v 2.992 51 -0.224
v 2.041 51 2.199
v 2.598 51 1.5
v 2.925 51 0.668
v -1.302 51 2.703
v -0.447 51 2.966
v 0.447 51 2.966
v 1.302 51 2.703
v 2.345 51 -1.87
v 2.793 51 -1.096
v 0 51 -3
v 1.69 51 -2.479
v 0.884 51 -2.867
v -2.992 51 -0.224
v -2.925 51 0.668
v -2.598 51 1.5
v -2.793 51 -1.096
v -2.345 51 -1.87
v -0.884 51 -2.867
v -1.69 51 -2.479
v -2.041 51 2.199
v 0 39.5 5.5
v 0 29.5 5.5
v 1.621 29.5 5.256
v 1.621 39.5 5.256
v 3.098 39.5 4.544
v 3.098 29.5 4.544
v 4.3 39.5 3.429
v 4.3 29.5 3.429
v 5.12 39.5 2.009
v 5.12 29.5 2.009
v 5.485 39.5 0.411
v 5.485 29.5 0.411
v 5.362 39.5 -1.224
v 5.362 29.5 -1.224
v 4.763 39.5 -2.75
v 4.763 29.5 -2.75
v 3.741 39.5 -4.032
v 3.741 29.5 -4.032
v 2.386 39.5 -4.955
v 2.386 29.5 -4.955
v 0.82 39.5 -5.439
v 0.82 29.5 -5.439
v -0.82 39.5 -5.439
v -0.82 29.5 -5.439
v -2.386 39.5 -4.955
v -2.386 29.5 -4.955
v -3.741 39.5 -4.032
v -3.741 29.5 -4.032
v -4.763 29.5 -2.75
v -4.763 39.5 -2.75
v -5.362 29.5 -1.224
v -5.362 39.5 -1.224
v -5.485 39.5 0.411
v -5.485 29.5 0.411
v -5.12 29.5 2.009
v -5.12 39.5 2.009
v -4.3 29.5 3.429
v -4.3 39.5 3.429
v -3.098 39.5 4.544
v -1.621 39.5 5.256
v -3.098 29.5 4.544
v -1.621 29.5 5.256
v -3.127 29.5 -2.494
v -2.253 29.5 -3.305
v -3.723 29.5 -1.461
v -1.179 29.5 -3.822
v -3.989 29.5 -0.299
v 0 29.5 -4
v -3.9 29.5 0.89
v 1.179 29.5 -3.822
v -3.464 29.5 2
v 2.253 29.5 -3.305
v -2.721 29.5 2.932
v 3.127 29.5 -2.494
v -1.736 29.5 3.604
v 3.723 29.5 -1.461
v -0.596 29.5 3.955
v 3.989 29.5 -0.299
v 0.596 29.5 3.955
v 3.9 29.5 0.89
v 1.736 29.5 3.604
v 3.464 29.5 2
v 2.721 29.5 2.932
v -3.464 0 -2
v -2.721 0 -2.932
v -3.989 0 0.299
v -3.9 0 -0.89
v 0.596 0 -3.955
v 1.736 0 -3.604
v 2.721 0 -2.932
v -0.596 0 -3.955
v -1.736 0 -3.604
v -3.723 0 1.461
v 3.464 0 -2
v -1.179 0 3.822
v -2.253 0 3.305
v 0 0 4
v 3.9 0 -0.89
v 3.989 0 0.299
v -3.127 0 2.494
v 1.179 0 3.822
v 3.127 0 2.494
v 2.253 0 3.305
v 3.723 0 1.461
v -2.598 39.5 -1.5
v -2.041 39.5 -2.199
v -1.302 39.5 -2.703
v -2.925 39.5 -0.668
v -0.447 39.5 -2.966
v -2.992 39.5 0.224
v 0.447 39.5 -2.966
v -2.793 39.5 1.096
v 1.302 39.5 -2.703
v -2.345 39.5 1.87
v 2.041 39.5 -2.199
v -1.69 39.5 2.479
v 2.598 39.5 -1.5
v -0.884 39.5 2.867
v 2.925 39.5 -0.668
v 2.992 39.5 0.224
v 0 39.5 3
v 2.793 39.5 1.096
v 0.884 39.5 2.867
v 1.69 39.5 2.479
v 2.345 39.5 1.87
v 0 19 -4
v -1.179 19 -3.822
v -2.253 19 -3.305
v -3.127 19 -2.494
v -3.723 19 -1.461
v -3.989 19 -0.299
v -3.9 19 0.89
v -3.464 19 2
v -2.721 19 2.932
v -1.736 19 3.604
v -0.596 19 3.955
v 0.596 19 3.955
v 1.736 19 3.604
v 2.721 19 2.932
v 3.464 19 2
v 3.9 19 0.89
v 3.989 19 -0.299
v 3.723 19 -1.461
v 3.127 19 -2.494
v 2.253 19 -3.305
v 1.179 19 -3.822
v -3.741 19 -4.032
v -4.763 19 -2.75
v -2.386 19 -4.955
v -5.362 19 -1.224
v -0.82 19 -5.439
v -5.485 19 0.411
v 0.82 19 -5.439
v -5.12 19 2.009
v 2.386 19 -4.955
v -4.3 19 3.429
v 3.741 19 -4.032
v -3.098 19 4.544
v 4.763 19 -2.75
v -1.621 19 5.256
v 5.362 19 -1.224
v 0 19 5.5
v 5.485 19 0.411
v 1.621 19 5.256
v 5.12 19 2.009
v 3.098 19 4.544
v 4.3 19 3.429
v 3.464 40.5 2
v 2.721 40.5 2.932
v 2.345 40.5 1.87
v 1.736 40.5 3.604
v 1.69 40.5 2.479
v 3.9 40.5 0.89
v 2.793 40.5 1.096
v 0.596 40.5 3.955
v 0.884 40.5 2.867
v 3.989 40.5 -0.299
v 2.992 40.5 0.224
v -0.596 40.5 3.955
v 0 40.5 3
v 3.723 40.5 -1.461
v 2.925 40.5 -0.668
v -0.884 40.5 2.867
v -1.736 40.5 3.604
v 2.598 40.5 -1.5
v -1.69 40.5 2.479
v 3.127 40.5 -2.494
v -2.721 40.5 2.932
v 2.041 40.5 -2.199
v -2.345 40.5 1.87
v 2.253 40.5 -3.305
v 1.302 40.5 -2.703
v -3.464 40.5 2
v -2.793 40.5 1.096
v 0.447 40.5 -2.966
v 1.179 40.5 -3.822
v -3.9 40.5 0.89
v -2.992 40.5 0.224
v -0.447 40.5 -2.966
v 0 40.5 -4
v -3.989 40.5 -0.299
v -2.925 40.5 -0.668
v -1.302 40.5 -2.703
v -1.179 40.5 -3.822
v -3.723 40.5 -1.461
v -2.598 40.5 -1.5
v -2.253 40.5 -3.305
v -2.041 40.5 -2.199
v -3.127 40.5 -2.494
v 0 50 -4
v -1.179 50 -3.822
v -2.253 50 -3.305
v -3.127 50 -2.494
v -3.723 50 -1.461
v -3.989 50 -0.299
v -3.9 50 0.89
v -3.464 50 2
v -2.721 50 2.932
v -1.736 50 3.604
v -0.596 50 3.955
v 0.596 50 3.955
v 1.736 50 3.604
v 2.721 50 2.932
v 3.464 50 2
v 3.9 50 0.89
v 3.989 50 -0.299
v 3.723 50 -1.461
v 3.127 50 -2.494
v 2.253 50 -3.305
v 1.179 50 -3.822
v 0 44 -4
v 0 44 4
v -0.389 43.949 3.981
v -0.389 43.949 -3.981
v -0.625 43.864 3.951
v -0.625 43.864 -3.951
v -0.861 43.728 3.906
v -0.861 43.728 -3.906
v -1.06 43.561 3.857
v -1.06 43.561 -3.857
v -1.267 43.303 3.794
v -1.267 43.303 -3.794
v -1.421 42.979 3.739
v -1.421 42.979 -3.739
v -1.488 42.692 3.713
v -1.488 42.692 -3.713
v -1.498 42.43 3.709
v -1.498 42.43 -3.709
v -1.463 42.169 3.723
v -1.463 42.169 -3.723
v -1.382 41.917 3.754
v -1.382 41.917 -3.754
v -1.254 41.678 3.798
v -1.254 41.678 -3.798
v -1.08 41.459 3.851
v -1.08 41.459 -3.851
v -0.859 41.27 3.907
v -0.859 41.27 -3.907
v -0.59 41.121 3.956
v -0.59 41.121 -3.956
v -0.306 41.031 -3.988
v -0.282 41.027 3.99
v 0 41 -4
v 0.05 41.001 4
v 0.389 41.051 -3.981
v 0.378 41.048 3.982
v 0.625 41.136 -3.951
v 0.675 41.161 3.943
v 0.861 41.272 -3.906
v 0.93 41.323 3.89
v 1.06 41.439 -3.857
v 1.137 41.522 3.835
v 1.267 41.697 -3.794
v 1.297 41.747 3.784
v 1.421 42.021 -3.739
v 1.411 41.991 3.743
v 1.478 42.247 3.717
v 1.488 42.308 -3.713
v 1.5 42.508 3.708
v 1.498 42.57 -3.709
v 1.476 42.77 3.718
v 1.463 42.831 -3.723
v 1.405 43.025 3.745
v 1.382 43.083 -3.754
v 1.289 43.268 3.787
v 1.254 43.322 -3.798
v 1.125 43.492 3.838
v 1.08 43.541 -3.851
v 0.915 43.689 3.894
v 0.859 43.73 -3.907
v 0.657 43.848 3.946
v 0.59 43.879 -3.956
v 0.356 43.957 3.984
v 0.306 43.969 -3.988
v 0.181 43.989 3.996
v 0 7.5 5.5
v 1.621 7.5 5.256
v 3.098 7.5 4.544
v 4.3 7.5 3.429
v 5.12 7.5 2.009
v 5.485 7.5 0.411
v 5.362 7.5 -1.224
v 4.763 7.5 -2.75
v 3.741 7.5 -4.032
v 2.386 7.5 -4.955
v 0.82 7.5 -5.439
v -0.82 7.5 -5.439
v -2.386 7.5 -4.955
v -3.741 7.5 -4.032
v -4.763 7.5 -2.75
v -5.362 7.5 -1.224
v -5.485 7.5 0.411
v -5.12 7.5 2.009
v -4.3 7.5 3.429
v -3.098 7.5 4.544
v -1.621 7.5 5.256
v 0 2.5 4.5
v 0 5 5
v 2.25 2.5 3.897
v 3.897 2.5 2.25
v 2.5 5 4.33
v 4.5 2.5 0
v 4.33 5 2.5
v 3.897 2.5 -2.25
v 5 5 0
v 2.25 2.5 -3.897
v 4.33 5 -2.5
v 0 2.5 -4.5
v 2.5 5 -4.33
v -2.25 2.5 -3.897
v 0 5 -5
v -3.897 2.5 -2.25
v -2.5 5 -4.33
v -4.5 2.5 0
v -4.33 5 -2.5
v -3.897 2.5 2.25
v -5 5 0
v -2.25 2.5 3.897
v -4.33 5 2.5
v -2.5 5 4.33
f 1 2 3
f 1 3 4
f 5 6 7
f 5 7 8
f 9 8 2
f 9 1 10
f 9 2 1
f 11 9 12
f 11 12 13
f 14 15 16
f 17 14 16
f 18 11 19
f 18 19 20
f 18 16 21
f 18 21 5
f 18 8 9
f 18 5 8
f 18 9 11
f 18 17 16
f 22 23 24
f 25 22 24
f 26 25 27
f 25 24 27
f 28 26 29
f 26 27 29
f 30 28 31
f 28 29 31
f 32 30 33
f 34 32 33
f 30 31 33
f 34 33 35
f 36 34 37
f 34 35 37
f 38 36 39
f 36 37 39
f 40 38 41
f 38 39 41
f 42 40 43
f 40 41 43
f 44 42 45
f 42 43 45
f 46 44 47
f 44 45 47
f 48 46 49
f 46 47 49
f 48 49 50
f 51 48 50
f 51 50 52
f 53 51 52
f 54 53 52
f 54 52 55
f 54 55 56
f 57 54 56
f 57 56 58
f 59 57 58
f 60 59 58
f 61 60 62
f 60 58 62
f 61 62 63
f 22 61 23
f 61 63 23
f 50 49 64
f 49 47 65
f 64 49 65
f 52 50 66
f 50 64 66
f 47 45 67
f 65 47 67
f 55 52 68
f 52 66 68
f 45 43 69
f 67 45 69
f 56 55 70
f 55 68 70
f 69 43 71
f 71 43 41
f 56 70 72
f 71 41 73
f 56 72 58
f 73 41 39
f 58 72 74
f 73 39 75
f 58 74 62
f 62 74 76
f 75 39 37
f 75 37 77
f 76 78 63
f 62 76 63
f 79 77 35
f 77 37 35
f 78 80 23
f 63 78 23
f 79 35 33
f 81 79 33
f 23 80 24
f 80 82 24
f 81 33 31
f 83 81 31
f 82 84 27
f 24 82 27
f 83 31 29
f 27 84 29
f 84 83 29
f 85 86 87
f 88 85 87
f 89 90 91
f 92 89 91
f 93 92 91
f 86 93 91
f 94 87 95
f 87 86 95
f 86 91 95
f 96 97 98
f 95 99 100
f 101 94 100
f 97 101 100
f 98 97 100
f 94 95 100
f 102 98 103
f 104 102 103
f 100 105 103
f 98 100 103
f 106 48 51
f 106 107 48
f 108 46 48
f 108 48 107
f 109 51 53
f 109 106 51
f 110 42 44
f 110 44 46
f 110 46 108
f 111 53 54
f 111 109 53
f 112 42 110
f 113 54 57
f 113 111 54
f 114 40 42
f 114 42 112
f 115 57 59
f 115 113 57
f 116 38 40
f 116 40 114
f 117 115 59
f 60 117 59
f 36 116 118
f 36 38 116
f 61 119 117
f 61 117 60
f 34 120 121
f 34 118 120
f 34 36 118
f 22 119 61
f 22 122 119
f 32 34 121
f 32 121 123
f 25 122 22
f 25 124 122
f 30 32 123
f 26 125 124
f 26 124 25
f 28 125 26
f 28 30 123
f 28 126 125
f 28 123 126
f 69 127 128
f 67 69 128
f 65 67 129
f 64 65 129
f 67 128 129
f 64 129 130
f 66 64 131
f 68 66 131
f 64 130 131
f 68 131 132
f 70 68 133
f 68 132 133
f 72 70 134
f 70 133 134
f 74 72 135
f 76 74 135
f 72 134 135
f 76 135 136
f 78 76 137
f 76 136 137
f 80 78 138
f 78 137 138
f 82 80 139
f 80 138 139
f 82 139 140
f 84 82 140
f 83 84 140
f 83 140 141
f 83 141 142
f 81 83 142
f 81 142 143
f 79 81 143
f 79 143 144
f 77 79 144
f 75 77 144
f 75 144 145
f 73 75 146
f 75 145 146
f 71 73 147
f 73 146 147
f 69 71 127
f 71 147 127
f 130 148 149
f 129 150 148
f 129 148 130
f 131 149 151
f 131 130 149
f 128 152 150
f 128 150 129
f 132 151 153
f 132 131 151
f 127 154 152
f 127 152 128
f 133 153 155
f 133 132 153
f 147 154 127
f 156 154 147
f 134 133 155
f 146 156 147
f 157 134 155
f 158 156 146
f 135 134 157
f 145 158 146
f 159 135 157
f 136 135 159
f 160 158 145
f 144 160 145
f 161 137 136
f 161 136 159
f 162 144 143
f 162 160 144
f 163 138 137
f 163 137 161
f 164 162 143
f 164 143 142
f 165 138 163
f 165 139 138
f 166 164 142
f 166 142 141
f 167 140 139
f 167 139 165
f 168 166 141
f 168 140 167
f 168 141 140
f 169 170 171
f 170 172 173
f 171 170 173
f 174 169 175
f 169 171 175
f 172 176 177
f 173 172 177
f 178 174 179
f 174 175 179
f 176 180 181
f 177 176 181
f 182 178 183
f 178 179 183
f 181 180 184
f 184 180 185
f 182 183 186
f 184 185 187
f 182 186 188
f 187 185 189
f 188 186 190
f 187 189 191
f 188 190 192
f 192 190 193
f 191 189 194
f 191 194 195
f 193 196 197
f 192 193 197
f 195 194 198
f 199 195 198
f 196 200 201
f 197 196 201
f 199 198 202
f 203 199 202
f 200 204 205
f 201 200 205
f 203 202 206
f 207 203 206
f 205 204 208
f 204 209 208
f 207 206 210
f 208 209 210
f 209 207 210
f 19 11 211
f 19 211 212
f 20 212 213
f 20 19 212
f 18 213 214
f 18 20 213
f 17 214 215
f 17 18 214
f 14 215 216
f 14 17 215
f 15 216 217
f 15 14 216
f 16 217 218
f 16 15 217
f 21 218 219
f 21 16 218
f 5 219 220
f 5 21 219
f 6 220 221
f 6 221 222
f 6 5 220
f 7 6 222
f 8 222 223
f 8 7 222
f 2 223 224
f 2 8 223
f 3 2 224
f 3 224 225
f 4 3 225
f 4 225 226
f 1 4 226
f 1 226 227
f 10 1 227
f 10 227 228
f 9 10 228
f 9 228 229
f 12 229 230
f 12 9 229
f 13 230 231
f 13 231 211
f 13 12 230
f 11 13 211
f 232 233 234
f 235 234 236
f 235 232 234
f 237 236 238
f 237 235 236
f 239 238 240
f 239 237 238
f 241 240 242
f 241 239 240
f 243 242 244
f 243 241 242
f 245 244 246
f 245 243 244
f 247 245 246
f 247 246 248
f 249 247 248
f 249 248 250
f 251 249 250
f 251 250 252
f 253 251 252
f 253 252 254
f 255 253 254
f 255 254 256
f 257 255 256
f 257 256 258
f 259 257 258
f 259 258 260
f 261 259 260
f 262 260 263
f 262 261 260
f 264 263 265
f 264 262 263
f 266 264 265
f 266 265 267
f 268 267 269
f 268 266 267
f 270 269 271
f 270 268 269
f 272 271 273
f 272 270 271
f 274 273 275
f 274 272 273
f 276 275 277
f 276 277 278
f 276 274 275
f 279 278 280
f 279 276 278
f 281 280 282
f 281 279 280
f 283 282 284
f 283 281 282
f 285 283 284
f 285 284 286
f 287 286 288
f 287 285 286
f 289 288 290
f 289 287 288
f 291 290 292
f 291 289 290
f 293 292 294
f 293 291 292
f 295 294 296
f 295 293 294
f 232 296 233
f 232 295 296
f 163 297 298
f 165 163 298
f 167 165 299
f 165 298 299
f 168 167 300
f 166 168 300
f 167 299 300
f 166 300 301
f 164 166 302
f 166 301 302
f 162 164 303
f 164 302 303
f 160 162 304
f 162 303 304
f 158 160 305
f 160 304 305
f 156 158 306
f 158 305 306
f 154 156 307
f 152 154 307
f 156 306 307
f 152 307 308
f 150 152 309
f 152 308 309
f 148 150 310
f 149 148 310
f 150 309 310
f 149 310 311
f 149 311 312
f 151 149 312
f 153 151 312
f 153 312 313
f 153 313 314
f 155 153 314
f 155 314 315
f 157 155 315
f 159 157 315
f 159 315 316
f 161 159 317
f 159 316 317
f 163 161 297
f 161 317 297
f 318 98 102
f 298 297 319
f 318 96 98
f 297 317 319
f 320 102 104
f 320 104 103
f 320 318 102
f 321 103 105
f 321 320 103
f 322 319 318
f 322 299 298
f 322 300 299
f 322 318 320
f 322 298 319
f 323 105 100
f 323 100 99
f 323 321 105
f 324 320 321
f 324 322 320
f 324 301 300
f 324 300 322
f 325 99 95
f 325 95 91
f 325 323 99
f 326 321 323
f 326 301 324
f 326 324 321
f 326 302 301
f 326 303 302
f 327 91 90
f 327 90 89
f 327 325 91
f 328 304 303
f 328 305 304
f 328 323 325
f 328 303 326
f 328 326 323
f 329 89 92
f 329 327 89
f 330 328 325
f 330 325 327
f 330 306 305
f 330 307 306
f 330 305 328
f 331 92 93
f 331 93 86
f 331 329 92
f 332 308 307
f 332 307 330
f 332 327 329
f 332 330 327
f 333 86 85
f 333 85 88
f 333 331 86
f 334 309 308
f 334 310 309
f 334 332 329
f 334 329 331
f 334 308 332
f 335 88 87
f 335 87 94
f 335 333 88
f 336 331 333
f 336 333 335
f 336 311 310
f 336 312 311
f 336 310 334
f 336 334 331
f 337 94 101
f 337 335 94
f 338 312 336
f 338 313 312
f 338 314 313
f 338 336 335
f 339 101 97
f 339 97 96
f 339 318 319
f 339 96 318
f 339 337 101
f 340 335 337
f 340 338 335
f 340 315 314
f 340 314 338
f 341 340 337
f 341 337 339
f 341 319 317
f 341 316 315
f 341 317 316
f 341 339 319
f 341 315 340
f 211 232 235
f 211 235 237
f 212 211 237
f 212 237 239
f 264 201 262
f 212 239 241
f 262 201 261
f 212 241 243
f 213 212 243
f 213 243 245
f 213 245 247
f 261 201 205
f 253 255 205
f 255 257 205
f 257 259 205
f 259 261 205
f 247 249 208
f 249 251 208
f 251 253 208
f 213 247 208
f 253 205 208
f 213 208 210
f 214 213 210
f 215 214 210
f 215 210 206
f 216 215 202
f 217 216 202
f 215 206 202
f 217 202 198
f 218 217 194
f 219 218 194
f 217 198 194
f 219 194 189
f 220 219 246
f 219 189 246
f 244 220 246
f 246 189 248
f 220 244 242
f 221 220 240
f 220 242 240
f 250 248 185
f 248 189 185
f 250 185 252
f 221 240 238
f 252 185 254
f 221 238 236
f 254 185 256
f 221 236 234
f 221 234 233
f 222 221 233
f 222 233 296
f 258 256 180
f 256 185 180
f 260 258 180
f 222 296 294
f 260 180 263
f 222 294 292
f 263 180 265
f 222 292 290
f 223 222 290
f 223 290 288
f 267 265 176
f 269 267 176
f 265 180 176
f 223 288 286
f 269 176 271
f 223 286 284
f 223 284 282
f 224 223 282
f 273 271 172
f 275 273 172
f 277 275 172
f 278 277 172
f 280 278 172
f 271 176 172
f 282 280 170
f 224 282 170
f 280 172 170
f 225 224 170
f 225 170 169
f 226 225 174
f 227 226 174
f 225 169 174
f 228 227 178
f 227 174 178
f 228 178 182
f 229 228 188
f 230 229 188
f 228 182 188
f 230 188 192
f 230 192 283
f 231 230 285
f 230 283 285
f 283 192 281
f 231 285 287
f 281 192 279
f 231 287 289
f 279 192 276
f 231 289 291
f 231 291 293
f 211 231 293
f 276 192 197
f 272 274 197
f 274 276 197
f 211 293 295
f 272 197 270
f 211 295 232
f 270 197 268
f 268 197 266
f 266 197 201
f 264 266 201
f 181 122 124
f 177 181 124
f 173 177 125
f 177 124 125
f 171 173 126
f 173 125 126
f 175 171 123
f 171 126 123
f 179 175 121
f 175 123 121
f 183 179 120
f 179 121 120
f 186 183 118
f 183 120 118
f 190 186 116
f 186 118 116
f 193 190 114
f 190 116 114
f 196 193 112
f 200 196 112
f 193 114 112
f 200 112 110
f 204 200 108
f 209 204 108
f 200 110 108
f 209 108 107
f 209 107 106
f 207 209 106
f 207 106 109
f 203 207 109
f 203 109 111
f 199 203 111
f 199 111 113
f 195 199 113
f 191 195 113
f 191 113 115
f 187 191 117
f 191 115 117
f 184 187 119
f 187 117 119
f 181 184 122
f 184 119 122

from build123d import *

# Parameters (mm, degrees)
ESQUISSE2_R                  = 5.5
BOSS_EXTRU_2_DEPTH           = 19
CHANFREIN1_SIZE              = 1.5
CHANFREIN1_SIZE2             = 7.5
ESQUISSE8_R                  = 4
BOSS_EXTRU_3_DEPTH           = 10.5
ESQUISSE9_R                  = 5.5
BOSS_EXTRU_4_DEPTH           = 10
ESQUISSE10_R                 = 3
BOSS_EXTRU_5_DEPTH           = 1
ESQUISSE12_R                 = 4
BOSS_EXTRU_6_DEPTH           = 10.5
CHANFREIN2_SIZE              = 1
ENL_V_MAT_EXTRU_1_DEPTH      = 52.58972766
ENL_V_MAT_EXTRU_1_DEPTH_BACK = 52.58972766
ESQUISSE15_R                 = 1.5


with BuildPart() as part:
    # Esquisse2 → Boss.-Extru.2 (new body)
    with BuildSketch(Plane(origin=(0, 0, 0), x_dir=(1, 0, 0), z_dir=(0, 1, 0))):
        with Locations(Location((0, 0, 0), (0, 0, 270))):
            Circle(ESQUISSE2_R)
    extrude(amount=BOSS_EXTRU_2_DEPTH)

    # Chanfrein1
    chanfrein1_edges = [part.edges().sort_by_distance(p)[0] for p in [
        (0, 0, -5.5),
    ]]
    chanfrein1_side = [part.faces().sort_by_distance(p)[0] for p in [
        (0, 0, 0),
    ]]
    chamfer(chanfrein1_edges, length=CHANFREIN1_SIZE, length2=CHANFREIN1_SIZE2, reference=chanfrein1_side[0])

    # Esquisse8 → Boss.-Extru.3 (add)
    with BuildSketch(Plane(origin=(0, 19, 0), x_dir=(1, 0, 0), z_dir=(0, 1, 0))):
        with Locations(Location((0, 0, 0), (0, 0, 90))):
            Circle(ESQUISSE8_R)
    extrude(amount=BOSS_EXTRU_3_DEPTH)

    # Esquisse9 → Boss.-Extru.4 (add)
    with BuildSketch(Plane(origin=(0, 29.5, 0), x_dir=(1, 0, 0), z_dir=(0, 1, 0))):
        with Locations(Location((0, 0, 0), (0, 0, 270))):
            Circle(ESQUISSE9_R)
    extrude(amount=BOSS_EXTRU_4_DEPTH)

    # Esquisse10 → Boss.-Extru.5 (add)
    with BuildSketch(Plane(origin=(0, 39.5, 0), x_dir=(1, 0, 0), z_dir=(0, 1, 0))):
        with Locations(Location((0, 0, 0), (0, 0, 270))):
            Circle(ESQUISSE10_R)
    extrude(amount=BOSS_EXTRU_5_DEPTH)

    # Esquisse12 → Boss.-Extru.6 (add)
    with BuildSketch(Plane(origin=(0, 40.5, 0), x_dir=(1, 0, 0), z_dir=(0, 1, 0))):
        with Locations(Location((0, 0, 0), (0, 0, 90))):
            Circle(ESQUISSE12_R)
    extrude(amount=BOSS_EXTRU_6_DEPTH)

    # Chanfrein2
    chanfrein2_edges = [part.edges().sort_by_distance(p)[0] for p in [
        (0, 51, 4),
    ]]
    chamfer(chanfrein2_edges, length=CHANFREIN2_SIZE)

    # Esquisse15 → Enlèv. mat.-Extru.1 (cut, two sides: drawn at the far end of the back side and taken through both)
    with BuildSketch(Plane.XY.offset(-ENL_V_MAT_EXTRU_1_DEPTH_BACK)):
        with Locations(Location((0, 42.5, 0), (0, 0, 90.000000025))):
            Circle(ESQUISSE15_R)
    extrude(amount=ENL_V_MAT_EXTRU_1_DEPTH + ENL_V_MAT_EXTRU_1_DEPTH_BACK, mode=Mode.SUBTRACT)


solid = part.part
